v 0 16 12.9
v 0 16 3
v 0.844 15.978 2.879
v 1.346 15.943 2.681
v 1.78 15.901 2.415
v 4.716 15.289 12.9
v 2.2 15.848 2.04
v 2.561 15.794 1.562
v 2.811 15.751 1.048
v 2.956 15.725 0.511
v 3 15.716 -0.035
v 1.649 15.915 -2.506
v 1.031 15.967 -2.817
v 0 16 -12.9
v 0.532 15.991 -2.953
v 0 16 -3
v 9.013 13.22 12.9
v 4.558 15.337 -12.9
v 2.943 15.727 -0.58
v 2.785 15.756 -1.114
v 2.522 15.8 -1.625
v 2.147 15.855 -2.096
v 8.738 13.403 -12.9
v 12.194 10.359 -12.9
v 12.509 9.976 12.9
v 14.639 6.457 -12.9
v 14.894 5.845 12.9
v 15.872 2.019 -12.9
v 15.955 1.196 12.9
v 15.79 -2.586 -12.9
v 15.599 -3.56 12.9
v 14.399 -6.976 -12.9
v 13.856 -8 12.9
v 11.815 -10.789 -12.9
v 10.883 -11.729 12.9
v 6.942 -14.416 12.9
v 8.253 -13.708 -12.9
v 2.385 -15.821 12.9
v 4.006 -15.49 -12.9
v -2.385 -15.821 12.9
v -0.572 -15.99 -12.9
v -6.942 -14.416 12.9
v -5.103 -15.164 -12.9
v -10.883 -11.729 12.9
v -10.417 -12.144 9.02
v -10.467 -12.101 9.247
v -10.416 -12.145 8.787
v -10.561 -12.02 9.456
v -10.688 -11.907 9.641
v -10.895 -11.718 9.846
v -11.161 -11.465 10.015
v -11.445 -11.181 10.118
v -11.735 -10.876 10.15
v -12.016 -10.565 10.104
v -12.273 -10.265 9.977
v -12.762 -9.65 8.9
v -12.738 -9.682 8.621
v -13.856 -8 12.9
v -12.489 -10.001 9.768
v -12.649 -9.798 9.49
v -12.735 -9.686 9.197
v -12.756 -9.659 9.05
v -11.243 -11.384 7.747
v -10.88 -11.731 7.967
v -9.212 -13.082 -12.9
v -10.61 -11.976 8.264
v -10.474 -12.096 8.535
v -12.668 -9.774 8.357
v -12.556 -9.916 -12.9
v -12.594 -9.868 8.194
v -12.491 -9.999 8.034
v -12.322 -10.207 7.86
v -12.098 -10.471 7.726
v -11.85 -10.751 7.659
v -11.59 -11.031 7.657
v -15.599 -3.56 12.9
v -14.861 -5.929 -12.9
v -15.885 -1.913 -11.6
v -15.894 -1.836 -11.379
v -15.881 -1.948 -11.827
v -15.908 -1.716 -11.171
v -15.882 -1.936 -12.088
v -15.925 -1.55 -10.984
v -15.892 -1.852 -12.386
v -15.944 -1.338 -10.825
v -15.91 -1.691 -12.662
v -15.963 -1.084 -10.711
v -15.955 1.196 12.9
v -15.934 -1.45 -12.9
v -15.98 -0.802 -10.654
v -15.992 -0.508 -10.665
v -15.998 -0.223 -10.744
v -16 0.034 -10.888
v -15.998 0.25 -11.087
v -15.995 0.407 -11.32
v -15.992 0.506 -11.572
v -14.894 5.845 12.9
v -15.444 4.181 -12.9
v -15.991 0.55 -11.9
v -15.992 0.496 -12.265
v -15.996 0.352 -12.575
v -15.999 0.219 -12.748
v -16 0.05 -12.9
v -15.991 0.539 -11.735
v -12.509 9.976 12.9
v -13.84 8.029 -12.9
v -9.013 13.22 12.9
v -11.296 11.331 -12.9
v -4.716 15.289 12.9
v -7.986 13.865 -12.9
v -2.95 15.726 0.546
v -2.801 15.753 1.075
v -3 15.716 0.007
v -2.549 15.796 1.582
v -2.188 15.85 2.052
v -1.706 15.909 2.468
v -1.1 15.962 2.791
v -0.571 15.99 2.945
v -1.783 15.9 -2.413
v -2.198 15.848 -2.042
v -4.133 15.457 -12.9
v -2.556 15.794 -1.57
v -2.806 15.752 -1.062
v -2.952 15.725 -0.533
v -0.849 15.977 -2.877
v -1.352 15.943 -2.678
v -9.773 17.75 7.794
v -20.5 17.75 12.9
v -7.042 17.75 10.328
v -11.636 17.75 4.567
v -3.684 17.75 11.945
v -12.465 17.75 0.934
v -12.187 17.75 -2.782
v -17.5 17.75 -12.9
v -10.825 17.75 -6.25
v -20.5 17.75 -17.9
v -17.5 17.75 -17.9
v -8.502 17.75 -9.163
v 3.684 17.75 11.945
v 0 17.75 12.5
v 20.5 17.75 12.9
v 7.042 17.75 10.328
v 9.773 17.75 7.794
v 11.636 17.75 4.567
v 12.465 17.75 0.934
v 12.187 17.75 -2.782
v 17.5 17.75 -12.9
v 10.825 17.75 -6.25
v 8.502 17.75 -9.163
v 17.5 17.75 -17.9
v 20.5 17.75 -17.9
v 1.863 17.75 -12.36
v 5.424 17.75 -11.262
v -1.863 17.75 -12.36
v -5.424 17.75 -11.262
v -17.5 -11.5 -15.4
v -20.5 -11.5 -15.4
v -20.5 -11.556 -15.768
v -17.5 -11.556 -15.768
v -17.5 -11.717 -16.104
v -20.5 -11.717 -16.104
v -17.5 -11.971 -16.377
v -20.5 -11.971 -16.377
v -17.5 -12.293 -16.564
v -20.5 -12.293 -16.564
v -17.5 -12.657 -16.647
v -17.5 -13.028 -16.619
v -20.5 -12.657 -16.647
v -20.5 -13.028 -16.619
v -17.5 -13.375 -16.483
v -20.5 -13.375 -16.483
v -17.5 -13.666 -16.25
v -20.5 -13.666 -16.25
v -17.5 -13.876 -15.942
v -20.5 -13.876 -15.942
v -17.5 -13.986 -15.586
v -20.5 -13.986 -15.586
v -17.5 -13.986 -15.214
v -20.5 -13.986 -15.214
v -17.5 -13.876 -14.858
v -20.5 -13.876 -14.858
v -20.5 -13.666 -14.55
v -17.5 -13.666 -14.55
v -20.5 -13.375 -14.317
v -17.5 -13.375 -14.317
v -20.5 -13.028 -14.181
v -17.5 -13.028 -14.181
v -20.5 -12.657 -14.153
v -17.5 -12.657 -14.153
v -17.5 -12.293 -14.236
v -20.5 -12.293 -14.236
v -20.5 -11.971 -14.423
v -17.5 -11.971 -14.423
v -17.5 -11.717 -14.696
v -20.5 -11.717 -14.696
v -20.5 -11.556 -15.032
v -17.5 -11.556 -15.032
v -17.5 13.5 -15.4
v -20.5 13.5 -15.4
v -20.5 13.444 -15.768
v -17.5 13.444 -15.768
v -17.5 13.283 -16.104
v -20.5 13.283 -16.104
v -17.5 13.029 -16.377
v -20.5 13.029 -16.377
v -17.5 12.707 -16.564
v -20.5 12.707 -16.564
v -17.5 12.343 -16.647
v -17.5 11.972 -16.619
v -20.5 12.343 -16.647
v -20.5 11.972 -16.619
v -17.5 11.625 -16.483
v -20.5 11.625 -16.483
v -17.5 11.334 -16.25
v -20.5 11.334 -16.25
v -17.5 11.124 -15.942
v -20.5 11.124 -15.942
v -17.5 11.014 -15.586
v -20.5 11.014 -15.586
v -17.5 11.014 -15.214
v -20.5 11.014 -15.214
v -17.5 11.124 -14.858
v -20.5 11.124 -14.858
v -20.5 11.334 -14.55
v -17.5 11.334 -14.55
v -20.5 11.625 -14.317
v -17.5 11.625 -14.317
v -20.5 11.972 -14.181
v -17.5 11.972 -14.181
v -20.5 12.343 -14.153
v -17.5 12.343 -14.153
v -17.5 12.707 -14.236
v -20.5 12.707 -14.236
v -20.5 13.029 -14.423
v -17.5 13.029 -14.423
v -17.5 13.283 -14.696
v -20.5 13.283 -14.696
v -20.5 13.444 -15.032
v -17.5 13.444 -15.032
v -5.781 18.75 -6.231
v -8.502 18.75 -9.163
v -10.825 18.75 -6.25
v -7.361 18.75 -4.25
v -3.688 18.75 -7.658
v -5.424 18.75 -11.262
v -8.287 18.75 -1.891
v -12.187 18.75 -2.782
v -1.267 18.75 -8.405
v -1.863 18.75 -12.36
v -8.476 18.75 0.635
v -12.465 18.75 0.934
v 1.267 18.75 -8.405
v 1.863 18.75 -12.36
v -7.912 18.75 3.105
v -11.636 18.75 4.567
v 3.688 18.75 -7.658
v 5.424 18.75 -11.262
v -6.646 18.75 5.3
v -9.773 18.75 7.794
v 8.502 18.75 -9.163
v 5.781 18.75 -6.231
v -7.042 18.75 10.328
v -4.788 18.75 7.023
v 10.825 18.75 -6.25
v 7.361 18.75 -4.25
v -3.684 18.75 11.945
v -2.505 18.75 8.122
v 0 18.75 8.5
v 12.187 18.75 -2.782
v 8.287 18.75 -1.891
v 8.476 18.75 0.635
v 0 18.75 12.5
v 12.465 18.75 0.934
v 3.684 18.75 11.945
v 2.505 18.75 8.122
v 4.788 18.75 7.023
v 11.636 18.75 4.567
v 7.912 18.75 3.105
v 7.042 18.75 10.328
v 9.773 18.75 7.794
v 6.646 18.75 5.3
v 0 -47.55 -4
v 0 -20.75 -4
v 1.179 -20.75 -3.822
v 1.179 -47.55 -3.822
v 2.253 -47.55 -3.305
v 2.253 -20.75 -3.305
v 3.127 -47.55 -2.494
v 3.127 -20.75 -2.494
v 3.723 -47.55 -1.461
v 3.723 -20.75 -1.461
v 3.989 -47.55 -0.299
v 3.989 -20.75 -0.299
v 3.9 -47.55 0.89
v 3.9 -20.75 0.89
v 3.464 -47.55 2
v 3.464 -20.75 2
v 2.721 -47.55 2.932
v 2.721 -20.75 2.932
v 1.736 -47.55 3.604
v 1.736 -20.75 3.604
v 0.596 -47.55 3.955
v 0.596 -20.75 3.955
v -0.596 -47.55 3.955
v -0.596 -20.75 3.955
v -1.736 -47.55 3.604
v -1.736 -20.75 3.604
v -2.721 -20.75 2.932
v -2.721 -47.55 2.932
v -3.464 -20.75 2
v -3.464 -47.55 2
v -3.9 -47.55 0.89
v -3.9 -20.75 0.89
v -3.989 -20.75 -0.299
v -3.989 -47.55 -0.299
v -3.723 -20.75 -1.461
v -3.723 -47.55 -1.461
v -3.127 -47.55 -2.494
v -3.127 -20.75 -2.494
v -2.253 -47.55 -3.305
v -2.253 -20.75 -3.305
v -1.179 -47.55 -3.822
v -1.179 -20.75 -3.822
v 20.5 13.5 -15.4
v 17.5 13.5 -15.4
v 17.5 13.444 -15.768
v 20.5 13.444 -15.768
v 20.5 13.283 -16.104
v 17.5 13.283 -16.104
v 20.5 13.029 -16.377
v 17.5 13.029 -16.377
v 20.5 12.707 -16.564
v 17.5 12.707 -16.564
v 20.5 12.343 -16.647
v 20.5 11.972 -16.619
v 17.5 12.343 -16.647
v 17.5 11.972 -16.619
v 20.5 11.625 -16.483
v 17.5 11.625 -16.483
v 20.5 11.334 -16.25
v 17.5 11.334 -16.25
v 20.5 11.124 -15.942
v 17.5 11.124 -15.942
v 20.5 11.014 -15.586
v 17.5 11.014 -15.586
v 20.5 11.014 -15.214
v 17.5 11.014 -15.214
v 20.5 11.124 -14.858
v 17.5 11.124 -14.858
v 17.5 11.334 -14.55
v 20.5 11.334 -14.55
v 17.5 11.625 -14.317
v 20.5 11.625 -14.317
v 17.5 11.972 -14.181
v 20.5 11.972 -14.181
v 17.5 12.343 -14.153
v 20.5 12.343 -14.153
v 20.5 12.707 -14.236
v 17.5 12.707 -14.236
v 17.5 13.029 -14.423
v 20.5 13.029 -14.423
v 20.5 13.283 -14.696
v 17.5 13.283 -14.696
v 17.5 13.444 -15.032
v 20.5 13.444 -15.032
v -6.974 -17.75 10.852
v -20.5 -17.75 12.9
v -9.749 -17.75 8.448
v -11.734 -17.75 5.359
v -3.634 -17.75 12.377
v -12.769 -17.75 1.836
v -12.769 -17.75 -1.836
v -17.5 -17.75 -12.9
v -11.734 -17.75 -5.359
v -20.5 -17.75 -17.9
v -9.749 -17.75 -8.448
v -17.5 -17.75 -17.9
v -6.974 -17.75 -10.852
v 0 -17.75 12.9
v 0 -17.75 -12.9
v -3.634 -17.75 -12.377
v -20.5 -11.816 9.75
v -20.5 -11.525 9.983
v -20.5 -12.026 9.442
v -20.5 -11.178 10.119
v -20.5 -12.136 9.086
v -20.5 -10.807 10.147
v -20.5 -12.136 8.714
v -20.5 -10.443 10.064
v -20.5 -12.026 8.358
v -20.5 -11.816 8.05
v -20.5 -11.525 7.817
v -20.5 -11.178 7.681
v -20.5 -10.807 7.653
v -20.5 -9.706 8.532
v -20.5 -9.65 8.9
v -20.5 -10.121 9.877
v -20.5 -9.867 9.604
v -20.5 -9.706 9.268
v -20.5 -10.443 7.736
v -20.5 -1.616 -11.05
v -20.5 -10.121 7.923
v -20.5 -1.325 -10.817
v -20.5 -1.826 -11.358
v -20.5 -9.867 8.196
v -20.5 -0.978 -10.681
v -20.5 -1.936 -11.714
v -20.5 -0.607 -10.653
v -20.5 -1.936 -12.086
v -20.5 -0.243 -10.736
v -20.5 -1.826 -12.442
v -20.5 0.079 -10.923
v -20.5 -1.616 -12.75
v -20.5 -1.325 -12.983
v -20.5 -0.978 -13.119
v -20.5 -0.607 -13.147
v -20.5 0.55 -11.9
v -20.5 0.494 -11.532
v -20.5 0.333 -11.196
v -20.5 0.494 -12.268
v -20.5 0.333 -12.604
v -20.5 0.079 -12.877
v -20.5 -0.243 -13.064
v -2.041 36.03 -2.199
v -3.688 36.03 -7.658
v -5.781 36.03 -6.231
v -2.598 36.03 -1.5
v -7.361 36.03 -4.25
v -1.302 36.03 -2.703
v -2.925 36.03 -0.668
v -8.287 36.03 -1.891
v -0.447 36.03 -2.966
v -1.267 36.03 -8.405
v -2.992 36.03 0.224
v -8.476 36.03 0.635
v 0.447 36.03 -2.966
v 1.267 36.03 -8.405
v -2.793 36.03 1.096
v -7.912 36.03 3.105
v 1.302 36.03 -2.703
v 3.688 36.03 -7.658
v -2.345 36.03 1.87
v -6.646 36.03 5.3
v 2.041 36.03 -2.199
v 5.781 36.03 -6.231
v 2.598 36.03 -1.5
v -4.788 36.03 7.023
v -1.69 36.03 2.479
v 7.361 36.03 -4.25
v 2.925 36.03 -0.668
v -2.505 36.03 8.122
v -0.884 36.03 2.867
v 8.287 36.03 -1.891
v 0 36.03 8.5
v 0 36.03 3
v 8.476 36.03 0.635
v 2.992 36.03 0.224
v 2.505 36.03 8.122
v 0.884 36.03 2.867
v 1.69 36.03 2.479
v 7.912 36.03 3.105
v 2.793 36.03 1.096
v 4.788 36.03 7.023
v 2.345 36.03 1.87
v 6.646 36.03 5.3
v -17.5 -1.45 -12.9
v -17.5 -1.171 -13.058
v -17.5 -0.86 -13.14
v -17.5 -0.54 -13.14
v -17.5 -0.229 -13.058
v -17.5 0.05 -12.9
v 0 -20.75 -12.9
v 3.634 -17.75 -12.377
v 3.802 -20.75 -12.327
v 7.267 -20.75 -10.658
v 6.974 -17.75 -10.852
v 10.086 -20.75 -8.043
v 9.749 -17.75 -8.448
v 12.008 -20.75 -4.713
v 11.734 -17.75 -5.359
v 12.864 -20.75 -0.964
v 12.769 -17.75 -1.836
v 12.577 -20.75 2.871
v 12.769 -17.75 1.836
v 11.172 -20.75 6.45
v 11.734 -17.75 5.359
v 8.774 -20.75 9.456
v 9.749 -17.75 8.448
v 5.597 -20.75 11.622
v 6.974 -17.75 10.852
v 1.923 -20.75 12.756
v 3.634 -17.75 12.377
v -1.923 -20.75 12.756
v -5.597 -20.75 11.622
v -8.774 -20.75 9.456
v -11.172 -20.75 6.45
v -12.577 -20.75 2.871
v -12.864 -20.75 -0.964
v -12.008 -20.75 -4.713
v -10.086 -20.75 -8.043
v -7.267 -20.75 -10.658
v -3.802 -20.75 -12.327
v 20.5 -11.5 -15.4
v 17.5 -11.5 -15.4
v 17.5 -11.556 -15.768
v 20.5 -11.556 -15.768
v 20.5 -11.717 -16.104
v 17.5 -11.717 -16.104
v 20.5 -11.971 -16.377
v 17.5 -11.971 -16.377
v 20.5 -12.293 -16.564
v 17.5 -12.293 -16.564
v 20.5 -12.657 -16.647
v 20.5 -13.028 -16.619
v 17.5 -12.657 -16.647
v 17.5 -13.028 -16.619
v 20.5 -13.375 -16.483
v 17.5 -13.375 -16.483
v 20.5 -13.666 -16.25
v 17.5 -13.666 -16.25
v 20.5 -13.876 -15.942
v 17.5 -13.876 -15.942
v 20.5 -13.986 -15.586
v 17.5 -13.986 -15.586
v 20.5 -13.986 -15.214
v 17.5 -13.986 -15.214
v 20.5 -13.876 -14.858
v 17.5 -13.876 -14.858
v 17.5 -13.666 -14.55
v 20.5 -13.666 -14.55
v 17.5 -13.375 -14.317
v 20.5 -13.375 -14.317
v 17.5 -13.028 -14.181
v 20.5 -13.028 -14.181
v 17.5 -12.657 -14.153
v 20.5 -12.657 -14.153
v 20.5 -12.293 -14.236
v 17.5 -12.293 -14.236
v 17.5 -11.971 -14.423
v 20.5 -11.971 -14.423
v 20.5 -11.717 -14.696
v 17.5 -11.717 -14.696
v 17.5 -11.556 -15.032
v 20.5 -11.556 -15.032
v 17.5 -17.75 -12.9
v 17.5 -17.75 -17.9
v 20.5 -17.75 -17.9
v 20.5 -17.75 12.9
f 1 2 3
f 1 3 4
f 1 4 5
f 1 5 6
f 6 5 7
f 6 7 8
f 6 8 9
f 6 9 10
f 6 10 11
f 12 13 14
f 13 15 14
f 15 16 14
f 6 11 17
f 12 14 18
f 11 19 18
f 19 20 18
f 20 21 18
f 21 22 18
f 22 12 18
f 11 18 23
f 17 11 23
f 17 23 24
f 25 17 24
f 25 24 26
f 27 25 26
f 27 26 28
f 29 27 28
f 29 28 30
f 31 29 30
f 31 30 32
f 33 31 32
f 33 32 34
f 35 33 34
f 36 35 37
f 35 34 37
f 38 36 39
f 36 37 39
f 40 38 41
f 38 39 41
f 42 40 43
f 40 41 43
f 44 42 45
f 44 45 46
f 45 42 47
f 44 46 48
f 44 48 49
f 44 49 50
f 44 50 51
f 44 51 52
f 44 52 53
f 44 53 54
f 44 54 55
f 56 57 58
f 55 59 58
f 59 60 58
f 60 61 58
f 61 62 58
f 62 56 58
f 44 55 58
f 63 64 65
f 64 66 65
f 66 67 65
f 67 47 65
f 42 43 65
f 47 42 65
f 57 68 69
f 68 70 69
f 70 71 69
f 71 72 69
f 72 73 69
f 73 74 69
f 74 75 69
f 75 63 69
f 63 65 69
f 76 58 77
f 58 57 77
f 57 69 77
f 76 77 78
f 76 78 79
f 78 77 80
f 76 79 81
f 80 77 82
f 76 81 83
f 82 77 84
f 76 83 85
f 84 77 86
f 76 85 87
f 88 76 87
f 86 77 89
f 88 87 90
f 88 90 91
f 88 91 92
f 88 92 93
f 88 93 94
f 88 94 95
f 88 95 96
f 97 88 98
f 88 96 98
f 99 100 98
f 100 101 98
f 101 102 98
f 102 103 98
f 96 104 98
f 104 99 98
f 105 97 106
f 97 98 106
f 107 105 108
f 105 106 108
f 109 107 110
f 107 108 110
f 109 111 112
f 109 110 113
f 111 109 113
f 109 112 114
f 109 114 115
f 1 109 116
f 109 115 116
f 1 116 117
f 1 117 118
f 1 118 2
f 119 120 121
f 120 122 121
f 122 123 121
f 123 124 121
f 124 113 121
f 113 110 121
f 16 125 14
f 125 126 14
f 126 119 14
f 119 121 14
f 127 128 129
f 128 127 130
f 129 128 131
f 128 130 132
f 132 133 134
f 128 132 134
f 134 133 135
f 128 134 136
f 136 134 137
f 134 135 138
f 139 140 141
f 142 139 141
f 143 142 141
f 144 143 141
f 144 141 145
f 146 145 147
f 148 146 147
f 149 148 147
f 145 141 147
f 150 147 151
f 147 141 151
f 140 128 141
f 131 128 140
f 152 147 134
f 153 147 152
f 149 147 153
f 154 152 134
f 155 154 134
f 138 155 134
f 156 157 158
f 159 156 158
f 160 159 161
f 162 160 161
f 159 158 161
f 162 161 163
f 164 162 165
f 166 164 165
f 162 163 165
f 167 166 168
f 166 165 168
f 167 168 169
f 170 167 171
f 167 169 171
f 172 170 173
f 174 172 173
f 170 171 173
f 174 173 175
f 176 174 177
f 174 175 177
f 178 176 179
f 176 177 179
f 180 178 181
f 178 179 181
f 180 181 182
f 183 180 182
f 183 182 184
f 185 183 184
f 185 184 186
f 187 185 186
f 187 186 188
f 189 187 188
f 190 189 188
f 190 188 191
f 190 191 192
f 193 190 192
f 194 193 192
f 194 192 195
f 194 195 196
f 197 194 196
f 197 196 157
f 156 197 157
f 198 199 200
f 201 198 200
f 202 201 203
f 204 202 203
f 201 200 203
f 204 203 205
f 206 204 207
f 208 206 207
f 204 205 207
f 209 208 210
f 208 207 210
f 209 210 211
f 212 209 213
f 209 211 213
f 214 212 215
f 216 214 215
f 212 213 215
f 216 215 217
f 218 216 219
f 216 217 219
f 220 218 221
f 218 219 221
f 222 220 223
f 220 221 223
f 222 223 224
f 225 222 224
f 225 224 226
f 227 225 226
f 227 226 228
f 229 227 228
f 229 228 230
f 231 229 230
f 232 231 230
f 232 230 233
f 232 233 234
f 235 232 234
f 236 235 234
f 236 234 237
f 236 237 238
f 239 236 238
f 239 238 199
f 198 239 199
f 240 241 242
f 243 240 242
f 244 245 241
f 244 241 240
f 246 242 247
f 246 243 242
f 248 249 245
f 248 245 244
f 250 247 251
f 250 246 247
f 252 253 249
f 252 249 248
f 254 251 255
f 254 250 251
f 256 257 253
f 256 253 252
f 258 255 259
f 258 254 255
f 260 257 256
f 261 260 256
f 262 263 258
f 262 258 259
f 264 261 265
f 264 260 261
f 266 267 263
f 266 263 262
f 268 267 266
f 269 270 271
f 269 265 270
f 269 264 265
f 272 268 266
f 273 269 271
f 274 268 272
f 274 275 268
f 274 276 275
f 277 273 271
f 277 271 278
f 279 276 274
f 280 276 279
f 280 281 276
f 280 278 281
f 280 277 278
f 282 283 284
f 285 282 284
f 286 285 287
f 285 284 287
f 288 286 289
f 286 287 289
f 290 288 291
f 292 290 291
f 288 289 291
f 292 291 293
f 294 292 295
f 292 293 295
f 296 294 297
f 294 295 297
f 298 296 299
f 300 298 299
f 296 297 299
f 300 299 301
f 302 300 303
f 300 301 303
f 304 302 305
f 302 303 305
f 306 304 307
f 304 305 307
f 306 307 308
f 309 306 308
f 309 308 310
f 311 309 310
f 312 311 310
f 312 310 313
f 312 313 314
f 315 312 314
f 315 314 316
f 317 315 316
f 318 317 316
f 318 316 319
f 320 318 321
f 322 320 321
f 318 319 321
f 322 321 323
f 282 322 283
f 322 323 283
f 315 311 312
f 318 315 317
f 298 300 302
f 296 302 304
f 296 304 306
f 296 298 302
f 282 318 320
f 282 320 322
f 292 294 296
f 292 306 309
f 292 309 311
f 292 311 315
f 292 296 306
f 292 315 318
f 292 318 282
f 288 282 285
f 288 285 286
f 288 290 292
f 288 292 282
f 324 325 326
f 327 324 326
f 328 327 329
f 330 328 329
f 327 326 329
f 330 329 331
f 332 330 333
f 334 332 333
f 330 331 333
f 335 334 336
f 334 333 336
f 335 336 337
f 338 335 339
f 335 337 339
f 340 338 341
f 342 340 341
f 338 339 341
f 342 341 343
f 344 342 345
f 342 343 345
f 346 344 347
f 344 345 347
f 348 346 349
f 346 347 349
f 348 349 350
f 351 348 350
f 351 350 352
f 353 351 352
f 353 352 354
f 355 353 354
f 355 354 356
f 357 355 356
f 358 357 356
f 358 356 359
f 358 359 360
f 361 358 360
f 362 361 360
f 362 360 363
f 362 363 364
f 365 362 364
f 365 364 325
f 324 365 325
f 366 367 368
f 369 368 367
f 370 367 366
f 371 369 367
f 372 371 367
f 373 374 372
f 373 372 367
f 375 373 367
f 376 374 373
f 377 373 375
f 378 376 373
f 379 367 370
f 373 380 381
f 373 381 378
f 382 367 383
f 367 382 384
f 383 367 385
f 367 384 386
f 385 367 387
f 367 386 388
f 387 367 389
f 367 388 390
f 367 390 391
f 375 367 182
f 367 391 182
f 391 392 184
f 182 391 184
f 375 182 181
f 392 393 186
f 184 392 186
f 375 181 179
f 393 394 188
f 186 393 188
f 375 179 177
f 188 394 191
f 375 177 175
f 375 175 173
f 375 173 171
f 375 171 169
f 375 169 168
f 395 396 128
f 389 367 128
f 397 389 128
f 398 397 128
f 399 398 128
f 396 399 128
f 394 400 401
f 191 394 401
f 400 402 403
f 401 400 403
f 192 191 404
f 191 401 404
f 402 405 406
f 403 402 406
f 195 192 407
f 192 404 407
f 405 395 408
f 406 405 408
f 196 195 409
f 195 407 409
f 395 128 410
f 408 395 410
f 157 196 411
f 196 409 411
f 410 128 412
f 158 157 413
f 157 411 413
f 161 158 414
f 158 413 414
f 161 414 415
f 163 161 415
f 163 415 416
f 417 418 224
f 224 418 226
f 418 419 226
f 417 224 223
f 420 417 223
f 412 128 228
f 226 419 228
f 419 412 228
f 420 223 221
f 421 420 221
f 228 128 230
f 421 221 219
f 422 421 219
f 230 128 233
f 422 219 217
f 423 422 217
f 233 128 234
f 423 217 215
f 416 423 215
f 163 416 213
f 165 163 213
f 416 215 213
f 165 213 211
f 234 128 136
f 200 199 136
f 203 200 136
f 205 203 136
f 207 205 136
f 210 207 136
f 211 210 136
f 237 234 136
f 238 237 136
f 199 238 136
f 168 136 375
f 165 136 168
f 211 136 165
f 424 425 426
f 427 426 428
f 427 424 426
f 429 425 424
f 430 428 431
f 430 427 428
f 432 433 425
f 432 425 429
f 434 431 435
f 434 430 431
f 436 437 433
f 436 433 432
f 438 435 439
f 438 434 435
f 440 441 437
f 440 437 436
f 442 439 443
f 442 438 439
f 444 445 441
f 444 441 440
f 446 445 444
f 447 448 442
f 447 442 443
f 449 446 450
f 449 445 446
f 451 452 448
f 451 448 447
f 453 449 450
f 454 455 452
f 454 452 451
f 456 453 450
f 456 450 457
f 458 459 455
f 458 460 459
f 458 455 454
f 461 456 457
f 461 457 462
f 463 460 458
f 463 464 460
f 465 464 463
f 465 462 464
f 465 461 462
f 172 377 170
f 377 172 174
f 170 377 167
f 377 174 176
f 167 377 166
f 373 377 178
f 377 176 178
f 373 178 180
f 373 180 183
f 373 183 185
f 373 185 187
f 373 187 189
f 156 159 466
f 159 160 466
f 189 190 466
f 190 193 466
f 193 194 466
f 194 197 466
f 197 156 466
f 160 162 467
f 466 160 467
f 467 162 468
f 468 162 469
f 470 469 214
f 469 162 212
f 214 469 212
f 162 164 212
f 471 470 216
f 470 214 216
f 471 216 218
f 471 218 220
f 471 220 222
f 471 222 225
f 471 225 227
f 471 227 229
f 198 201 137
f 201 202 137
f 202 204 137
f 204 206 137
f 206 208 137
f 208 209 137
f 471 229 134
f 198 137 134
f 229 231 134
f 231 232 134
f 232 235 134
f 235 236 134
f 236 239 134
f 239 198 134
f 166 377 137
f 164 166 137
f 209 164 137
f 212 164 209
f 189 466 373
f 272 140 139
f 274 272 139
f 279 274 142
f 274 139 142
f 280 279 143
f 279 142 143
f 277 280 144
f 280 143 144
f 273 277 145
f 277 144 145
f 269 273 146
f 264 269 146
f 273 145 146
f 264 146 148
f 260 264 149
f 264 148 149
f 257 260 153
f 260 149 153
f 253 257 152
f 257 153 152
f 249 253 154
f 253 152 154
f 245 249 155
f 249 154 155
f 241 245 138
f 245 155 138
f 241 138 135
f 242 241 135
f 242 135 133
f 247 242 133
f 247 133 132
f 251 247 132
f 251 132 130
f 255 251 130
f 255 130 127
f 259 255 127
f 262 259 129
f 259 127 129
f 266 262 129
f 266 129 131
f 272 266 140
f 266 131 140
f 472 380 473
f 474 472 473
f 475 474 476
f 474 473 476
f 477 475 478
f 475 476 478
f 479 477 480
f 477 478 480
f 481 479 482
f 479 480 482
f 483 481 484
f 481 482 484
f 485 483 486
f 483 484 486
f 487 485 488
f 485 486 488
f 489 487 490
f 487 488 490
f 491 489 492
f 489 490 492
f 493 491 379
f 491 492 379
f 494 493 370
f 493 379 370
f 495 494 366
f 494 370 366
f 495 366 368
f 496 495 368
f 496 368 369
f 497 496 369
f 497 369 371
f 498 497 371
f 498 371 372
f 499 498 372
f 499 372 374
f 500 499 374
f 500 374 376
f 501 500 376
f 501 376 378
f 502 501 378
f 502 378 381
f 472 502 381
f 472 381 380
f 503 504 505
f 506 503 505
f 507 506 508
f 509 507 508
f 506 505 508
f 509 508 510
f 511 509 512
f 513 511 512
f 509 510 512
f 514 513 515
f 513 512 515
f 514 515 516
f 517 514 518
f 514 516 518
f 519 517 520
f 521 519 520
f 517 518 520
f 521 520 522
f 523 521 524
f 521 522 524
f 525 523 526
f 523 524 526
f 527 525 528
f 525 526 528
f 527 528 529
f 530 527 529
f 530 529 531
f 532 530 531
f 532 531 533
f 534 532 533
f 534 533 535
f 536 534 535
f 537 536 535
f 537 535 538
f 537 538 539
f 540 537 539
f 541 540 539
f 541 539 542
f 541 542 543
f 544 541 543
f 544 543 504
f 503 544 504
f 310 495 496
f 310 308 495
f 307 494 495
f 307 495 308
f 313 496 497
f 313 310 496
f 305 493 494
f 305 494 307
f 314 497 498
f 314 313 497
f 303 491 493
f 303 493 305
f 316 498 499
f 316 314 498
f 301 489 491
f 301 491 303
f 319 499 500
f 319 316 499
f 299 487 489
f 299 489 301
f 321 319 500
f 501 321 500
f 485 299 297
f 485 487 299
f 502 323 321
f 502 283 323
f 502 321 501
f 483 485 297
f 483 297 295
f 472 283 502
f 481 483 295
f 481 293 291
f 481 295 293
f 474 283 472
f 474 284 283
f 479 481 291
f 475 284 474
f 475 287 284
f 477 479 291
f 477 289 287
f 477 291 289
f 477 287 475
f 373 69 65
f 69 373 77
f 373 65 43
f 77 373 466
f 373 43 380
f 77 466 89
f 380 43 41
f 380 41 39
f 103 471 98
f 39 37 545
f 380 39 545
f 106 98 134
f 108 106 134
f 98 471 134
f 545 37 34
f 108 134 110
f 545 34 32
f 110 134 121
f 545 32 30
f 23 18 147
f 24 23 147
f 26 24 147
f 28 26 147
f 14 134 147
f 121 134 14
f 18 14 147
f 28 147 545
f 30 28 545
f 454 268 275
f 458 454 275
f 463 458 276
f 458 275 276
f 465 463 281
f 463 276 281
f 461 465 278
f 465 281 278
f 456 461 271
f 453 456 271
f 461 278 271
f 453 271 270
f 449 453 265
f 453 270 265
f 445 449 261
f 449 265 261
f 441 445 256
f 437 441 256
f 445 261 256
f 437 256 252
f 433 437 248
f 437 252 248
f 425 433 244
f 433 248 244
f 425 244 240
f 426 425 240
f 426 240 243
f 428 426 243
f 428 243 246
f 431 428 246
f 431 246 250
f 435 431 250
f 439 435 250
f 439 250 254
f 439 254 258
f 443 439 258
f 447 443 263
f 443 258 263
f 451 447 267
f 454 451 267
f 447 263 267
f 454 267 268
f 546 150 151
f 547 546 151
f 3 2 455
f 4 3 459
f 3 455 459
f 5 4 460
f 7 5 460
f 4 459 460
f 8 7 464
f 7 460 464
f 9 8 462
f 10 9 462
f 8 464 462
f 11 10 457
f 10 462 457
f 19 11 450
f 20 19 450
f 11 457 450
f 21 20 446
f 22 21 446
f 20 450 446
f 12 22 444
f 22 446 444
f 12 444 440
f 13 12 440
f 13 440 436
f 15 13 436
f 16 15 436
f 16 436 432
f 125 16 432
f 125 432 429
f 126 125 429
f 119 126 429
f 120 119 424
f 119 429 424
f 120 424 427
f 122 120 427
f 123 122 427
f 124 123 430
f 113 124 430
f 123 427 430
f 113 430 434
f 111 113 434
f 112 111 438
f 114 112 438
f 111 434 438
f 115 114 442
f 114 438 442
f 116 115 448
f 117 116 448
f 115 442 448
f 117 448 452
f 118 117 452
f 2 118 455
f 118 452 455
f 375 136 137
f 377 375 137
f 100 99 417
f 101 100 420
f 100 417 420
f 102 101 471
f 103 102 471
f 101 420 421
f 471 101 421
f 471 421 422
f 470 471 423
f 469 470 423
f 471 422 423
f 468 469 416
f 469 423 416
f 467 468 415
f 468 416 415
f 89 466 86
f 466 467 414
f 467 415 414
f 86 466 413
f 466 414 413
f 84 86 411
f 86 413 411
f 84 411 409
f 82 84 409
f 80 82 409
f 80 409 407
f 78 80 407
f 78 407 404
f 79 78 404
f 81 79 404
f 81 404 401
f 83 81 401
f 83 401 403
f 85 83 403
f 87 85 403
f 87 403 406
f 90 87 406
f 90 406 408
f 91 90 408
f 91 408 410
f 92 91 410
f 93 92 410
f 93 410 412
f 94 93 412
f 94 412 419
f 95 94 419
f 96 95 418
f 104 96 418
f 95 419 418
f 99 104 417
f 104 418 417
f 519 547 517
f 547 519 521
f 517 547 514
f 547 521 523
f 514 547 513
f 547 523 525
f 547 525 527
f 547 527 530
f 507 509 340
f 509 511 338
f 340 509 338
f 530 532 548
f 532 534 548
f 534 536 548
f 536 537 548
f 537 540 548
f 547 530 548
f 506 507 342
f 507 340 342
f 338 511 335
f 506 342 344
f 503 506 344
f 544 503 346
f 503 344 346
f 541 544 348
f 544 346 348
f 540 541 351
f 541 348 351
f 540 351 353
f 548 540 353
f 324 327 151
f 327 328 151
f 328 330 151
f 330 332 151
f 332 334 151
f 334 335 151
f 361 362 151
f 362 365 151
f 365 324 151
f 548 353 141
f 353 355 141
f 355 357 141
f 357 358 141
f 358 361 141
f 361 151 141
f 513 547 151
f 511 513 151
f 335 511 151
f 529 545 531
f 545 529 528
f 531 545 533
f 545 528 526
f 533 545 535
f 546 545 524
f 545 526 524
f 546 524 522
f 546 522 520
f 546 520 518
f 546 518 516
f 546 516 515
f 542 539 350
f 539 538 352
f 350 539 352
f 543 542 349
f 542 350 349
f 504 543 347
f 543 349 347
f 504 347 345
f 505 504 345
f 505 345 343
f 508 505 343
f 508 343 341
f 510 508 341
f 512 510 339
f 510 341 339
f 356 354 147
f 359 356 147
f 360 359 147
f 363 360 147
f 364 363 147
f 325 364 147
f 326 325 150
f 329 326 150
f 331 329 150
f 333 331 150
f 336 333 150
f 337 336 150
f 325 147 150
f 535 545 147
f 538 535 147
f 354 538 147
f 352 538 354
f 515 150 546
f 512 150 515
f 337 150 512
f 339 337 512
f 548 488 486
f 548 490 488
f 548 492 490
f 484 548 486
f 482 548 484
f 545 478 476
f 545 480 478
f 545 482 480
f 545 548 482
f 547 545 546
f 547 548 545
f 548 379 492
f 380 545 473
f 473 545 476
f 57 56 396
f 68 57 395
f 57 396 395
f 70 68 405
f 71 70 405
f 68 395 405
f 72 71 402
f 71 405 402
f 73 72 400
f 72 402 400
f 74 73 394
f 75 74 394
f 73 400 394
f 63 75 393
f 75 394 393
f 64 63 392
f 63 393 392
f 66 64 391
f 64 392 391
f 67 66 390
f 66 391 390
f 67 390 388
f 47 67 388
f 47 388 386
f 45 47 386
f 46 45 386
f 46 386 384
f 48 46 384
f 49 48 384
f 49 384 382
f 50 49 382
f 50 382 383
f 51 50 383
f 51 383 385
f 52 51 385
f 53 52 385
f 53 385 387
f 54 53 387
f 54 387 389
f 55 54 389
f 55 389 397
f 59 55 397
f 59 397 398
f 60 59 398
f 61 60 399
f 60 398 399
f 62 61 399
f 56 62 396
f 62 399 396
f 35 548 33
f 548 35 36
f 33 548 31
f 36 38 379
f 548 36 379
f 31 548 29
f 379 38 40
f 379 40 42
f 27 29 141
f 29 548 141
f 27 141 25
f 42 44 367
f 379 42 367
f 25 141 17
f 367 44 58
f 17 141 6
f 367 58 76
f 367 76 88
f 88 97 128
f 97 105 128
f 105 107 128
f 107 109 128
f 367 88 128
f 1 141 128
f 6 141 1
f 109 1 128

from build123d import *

# Parameters (mm, degrees)
BOSS_EXTRUDE1_DEPTH     = 35.5
SKETCH2_R               = 12.9
BOSS_EXTRUDE2_DEPTH     = 3
SKETCH3_R               = 4
BOSS_EXTRUDE3_DEPTH     = 26.8
SKETCH4_R               = 12.5
BOSS_EXTRUDE4_DEPTH     = 1
SKETCH5_R               = 8.5
BOSS_EXTRUDE5_DEPTH     = 17.28
CUT_EXTRUDE1_REACH      = 83.306
SKETCH6_R               = 16
CUT_EXTRUDE2_REACH      = 96.36
CUT_EXTRUDE2_END_RADIUS = 16
SKETCH7_R               = 3
CUT_EXTRUDE3_REACH      = 80.627
SKETCH8_R               = 1.25
CUT_EXTRUDE4_REACH      = 79.105
SKETCH9_R               = 1.25
BODY_MOVE_COPY2_ANGLE   = 120


with BuildPart() as part:
    # Sketch1 → Boss-Extrude1 (new body)
    with BuildSketch(Plane.XY):
        Polygon((15.4, 41), (-15.4, 41), (-15.4, 0), (15.4, 0), (15.4, 3), (10.4, 3), (10.4, 38), (15.4, 38), align=None)
    extrude(amount=BOSS_EXTRUDE1_DEPTH)

    # Sketch2 → Boss-Extrude2 (add)
    with BuildSketch(Plane.XY.offset(35.5)):
        with Locations((-2.5, 20.5)):
            Circle(SKETCH2_R)
    extrude(amount=BOSS_EXTRUDE2_DEPTH)

    # Sketch3 → Boss-Extrude3 (add)
    with BuildSketch(Plane.XY.offset(38.5)):
        with Locations((-2.5, 20.5)):
            Circle(SKETCH3_R)
    extrude(amount=BOSS_EXTRUDE3_DEPTH)

    # Sketch4 → Boss-Extrude4 (add)
    with BuildSketch(Plane(origin=(0, 0, 0), x_dir=(-1, 0, 0), z_dir=(0, 0, -1))):
        with Locations((2.5, 20.5)):
            Circle(SKETCH4_R)
    extrude(amount=BOSS_EXTRUDE4_DEPTH)

    # Sketch5 → Boss-Extrude5 (add)
    with BuildSketch(Plane(origin=(0, 0, -1), x_dir=(-1, 0, 0), z_dir=(0, 0, -1))):
        with Locations((2.5, 20.5)):
            Circle(SKETCH5_R)
    extrude(amount=BOSS_EXTRUDE5_DEPTH)

    # Sketch6 → Cut-Extrude1 (cut, up to next)
    with BuildSketch(Plane(origin=(10.4, 0, 0), x_dir=(0, 0, -1), z_dir=(1, 0, 0)), mode=Mode.PRIVATE) as cut_extrude1_sk1:
        with Locations((-17.75, 20.5)):
            Circle(SKETCH6_R)
    cut_extrude1_tool1 = extrude(cut_extrude1_sk1.sketch, amount=-CUT_EXTRUDE1_REACH, mode=Mode.PRIVATE) & part.part
    add(cut_extrude1_tool1.solids().sort_by_distance((10.4, 20.5, 17.75))[0], mode=Mode.SUBTRACT)

    # Cut-Extrude2: up to this cylinder (the profile starts outside it)
    cut_extrude2_end = Plane(origin=(-2.5, 20.5, 17.75), z_dir=(1, 0, 0)) * Cylinder(CUT_EXTRUDE2_END_RADIUS, 225.72, mode=Mode.PRIVATE)
    # Sketch7 → Cut-Extrude2 (cut, up to the surface)
    with BuildSketch(Plane(origin=(0, 0, -18.28), x_dir=(-1, 0, 0), z_dir=(0, 0, -1)), mode=Mode.PRIVATE) as cut_extrude2_sk1:
        with Locations((2.5, 20.5)):
            Circle(SKETCH7_R)
    cut_extrude2_tool1 = extrude(cut_extrude2_sk1.sketch, amount=-CUT_EXTRUDE2_REACH, mode=Mode.PRIVATE) - cut_extrude2_end
    add(cut_extrude2_tool1.solids().sort_by_distance((-2.5, 20.5, -18.28))[0], mode=Mode.SUBTRACT)

    # Sketch8 → Cut-Extrude3 (cut, up to next)
    with BuildSketch(Plane.XZ, mode=Mode.PRIVATE) as cut_extrude3_sk1:
        with Locations(Location((12.9, 30.5, 0), (0, 0, 270))):
            Circle(SKETCH8_R)
    cut_extrude3_tool1 = extrude(cut_extrude3_sk1.sketch, amount=-CUT_EXTRUDE3_REACH, mode=Mode.PRIVATE) & part.part
    # Sketch8 → Cut-Extrude3 (cut, up to next)
    with BuildSketch(Plane.XZ, mode=Mode.PRIVATE) as cut_extrude3_sk2:
        with Locations(Location((12.9, 5.5, 0), (0, 0, 270))):
            Circle(SKETCH8_R)
    cut_extrude3_tool2 = extrude(cut_extrude3_sk2.sketch, amount=-CUT_EXTRUDE3_REACH, mode=Mode.PRIVATE) & part.part
    # Sketch8 → Cut-Extrude3 (cut, up to next)
    with BuildSketch(Plane.XZ, mode=Mode.PRIVATE) as cut_extrude3_sk3:
        with Locations(Location((9.4, 18.45, 0), (0, 0, 270))):
            Circle(SKETCH8_R)
    cut_extrude3_tool3 = extrude(cut_extrude3_sk3.sketch, amount=-CUT_EXTRUDE3_REACH, mode=Mode.PRIVATE) & part.part
    # Sketch8 → Cut-Extrude3 (cut, up to next)
    with BuildSketch(Plane.XZ, mode=Mode.PRIVATE) as cut_extrude3_sk4:
        with Locations(Location((-11.4, 28.65, 0), (0, 0, 270))):
            Circle(SKETCH8_R)
    cut_extrude3_tool4 = extrude(cut_extrude3_sk4.sketch, amount=-CUT_EXTRUDE3_REACH, mode=Mode.PRIVATE) & part.part
    add(cut_extrude3_tool1.solids().sort_by_distance((12.9, 0, 30.5))[0], mode=Mode.SUBTRACT)
    add(cut_extrude3_tool2.solids().sort_by_distance((12.9, 0, 5.5))[0], mode=Mode.SUBTRACT)
    add(cut_extrude3_tool3.solids().sort_by_distance((9.4, 0, 18.45))[0], mode=Mode.SUBTRACT)
    add(cut_extrude3_tool4.solids().sort_by_distance((-11.4, 0, 28.65))[0], mode=Mode.SUBTRACT)

    # Sketch9 → Cut-Extrude4 (cut, up to next)
    with BuildSketch(Plane.XZ.offset(-38), mode=Mode.PRIVATE) as cut_extrude4_sk1:
        with Locations(Location((12.9, 30.5, 0), (0, 0, 270))):
            Circle(SKETCH9_R)
    cut_extrude4_tool1 = extrude(cut_extrude4_sk1.sketch, amount=-CUT_EXTRUDE4_REACH, mode=Mode.PRIVATE) & part.part
    # Sketch9 → Cut-Extrude4 (cut, up to next)
    with BuildSketch(Plane.XZ.offset(-38), mode=Mode.PRIVATE) as cut_extrude4_sk2:
        with Locations(Location((12.9, 5.5, 0), (0, 0, 270))):
            Circle(SKETCH9_R)
    cut_extrude4_tool2 = extrude(cut_extrude4_sk2.sketch, amount=-CUT_EXTRUDE4_REACH, mode=Mode.PRIVATE) & part.part
    add(cut_extrude4_tool1.solids().sort_by_distance((12.9, 38, 30.5))[0], mode=Mode.SUBTRACT)
    add(cut_extrude4_tool2.solids().sort_by_distance((12.9, 38, 5.5))[0], mode=Mode.SUBTRACT)


with BuildPart() as part_1:
    # Body-Move/Copy1: moved
    add(part.part.moved(Location((2.5, -20.5, -17.75))))


with BuildPart() as part_2:
    # Body-Move/Copy2: moved
    add(part_1.part.rotate(Axis((0, 0, 0), (0.5773502691896272, 0.5773502691896252, -0.5773502691896252)), BODY_MOVE_COPY2_ANGLE))


solid = part_2.part
